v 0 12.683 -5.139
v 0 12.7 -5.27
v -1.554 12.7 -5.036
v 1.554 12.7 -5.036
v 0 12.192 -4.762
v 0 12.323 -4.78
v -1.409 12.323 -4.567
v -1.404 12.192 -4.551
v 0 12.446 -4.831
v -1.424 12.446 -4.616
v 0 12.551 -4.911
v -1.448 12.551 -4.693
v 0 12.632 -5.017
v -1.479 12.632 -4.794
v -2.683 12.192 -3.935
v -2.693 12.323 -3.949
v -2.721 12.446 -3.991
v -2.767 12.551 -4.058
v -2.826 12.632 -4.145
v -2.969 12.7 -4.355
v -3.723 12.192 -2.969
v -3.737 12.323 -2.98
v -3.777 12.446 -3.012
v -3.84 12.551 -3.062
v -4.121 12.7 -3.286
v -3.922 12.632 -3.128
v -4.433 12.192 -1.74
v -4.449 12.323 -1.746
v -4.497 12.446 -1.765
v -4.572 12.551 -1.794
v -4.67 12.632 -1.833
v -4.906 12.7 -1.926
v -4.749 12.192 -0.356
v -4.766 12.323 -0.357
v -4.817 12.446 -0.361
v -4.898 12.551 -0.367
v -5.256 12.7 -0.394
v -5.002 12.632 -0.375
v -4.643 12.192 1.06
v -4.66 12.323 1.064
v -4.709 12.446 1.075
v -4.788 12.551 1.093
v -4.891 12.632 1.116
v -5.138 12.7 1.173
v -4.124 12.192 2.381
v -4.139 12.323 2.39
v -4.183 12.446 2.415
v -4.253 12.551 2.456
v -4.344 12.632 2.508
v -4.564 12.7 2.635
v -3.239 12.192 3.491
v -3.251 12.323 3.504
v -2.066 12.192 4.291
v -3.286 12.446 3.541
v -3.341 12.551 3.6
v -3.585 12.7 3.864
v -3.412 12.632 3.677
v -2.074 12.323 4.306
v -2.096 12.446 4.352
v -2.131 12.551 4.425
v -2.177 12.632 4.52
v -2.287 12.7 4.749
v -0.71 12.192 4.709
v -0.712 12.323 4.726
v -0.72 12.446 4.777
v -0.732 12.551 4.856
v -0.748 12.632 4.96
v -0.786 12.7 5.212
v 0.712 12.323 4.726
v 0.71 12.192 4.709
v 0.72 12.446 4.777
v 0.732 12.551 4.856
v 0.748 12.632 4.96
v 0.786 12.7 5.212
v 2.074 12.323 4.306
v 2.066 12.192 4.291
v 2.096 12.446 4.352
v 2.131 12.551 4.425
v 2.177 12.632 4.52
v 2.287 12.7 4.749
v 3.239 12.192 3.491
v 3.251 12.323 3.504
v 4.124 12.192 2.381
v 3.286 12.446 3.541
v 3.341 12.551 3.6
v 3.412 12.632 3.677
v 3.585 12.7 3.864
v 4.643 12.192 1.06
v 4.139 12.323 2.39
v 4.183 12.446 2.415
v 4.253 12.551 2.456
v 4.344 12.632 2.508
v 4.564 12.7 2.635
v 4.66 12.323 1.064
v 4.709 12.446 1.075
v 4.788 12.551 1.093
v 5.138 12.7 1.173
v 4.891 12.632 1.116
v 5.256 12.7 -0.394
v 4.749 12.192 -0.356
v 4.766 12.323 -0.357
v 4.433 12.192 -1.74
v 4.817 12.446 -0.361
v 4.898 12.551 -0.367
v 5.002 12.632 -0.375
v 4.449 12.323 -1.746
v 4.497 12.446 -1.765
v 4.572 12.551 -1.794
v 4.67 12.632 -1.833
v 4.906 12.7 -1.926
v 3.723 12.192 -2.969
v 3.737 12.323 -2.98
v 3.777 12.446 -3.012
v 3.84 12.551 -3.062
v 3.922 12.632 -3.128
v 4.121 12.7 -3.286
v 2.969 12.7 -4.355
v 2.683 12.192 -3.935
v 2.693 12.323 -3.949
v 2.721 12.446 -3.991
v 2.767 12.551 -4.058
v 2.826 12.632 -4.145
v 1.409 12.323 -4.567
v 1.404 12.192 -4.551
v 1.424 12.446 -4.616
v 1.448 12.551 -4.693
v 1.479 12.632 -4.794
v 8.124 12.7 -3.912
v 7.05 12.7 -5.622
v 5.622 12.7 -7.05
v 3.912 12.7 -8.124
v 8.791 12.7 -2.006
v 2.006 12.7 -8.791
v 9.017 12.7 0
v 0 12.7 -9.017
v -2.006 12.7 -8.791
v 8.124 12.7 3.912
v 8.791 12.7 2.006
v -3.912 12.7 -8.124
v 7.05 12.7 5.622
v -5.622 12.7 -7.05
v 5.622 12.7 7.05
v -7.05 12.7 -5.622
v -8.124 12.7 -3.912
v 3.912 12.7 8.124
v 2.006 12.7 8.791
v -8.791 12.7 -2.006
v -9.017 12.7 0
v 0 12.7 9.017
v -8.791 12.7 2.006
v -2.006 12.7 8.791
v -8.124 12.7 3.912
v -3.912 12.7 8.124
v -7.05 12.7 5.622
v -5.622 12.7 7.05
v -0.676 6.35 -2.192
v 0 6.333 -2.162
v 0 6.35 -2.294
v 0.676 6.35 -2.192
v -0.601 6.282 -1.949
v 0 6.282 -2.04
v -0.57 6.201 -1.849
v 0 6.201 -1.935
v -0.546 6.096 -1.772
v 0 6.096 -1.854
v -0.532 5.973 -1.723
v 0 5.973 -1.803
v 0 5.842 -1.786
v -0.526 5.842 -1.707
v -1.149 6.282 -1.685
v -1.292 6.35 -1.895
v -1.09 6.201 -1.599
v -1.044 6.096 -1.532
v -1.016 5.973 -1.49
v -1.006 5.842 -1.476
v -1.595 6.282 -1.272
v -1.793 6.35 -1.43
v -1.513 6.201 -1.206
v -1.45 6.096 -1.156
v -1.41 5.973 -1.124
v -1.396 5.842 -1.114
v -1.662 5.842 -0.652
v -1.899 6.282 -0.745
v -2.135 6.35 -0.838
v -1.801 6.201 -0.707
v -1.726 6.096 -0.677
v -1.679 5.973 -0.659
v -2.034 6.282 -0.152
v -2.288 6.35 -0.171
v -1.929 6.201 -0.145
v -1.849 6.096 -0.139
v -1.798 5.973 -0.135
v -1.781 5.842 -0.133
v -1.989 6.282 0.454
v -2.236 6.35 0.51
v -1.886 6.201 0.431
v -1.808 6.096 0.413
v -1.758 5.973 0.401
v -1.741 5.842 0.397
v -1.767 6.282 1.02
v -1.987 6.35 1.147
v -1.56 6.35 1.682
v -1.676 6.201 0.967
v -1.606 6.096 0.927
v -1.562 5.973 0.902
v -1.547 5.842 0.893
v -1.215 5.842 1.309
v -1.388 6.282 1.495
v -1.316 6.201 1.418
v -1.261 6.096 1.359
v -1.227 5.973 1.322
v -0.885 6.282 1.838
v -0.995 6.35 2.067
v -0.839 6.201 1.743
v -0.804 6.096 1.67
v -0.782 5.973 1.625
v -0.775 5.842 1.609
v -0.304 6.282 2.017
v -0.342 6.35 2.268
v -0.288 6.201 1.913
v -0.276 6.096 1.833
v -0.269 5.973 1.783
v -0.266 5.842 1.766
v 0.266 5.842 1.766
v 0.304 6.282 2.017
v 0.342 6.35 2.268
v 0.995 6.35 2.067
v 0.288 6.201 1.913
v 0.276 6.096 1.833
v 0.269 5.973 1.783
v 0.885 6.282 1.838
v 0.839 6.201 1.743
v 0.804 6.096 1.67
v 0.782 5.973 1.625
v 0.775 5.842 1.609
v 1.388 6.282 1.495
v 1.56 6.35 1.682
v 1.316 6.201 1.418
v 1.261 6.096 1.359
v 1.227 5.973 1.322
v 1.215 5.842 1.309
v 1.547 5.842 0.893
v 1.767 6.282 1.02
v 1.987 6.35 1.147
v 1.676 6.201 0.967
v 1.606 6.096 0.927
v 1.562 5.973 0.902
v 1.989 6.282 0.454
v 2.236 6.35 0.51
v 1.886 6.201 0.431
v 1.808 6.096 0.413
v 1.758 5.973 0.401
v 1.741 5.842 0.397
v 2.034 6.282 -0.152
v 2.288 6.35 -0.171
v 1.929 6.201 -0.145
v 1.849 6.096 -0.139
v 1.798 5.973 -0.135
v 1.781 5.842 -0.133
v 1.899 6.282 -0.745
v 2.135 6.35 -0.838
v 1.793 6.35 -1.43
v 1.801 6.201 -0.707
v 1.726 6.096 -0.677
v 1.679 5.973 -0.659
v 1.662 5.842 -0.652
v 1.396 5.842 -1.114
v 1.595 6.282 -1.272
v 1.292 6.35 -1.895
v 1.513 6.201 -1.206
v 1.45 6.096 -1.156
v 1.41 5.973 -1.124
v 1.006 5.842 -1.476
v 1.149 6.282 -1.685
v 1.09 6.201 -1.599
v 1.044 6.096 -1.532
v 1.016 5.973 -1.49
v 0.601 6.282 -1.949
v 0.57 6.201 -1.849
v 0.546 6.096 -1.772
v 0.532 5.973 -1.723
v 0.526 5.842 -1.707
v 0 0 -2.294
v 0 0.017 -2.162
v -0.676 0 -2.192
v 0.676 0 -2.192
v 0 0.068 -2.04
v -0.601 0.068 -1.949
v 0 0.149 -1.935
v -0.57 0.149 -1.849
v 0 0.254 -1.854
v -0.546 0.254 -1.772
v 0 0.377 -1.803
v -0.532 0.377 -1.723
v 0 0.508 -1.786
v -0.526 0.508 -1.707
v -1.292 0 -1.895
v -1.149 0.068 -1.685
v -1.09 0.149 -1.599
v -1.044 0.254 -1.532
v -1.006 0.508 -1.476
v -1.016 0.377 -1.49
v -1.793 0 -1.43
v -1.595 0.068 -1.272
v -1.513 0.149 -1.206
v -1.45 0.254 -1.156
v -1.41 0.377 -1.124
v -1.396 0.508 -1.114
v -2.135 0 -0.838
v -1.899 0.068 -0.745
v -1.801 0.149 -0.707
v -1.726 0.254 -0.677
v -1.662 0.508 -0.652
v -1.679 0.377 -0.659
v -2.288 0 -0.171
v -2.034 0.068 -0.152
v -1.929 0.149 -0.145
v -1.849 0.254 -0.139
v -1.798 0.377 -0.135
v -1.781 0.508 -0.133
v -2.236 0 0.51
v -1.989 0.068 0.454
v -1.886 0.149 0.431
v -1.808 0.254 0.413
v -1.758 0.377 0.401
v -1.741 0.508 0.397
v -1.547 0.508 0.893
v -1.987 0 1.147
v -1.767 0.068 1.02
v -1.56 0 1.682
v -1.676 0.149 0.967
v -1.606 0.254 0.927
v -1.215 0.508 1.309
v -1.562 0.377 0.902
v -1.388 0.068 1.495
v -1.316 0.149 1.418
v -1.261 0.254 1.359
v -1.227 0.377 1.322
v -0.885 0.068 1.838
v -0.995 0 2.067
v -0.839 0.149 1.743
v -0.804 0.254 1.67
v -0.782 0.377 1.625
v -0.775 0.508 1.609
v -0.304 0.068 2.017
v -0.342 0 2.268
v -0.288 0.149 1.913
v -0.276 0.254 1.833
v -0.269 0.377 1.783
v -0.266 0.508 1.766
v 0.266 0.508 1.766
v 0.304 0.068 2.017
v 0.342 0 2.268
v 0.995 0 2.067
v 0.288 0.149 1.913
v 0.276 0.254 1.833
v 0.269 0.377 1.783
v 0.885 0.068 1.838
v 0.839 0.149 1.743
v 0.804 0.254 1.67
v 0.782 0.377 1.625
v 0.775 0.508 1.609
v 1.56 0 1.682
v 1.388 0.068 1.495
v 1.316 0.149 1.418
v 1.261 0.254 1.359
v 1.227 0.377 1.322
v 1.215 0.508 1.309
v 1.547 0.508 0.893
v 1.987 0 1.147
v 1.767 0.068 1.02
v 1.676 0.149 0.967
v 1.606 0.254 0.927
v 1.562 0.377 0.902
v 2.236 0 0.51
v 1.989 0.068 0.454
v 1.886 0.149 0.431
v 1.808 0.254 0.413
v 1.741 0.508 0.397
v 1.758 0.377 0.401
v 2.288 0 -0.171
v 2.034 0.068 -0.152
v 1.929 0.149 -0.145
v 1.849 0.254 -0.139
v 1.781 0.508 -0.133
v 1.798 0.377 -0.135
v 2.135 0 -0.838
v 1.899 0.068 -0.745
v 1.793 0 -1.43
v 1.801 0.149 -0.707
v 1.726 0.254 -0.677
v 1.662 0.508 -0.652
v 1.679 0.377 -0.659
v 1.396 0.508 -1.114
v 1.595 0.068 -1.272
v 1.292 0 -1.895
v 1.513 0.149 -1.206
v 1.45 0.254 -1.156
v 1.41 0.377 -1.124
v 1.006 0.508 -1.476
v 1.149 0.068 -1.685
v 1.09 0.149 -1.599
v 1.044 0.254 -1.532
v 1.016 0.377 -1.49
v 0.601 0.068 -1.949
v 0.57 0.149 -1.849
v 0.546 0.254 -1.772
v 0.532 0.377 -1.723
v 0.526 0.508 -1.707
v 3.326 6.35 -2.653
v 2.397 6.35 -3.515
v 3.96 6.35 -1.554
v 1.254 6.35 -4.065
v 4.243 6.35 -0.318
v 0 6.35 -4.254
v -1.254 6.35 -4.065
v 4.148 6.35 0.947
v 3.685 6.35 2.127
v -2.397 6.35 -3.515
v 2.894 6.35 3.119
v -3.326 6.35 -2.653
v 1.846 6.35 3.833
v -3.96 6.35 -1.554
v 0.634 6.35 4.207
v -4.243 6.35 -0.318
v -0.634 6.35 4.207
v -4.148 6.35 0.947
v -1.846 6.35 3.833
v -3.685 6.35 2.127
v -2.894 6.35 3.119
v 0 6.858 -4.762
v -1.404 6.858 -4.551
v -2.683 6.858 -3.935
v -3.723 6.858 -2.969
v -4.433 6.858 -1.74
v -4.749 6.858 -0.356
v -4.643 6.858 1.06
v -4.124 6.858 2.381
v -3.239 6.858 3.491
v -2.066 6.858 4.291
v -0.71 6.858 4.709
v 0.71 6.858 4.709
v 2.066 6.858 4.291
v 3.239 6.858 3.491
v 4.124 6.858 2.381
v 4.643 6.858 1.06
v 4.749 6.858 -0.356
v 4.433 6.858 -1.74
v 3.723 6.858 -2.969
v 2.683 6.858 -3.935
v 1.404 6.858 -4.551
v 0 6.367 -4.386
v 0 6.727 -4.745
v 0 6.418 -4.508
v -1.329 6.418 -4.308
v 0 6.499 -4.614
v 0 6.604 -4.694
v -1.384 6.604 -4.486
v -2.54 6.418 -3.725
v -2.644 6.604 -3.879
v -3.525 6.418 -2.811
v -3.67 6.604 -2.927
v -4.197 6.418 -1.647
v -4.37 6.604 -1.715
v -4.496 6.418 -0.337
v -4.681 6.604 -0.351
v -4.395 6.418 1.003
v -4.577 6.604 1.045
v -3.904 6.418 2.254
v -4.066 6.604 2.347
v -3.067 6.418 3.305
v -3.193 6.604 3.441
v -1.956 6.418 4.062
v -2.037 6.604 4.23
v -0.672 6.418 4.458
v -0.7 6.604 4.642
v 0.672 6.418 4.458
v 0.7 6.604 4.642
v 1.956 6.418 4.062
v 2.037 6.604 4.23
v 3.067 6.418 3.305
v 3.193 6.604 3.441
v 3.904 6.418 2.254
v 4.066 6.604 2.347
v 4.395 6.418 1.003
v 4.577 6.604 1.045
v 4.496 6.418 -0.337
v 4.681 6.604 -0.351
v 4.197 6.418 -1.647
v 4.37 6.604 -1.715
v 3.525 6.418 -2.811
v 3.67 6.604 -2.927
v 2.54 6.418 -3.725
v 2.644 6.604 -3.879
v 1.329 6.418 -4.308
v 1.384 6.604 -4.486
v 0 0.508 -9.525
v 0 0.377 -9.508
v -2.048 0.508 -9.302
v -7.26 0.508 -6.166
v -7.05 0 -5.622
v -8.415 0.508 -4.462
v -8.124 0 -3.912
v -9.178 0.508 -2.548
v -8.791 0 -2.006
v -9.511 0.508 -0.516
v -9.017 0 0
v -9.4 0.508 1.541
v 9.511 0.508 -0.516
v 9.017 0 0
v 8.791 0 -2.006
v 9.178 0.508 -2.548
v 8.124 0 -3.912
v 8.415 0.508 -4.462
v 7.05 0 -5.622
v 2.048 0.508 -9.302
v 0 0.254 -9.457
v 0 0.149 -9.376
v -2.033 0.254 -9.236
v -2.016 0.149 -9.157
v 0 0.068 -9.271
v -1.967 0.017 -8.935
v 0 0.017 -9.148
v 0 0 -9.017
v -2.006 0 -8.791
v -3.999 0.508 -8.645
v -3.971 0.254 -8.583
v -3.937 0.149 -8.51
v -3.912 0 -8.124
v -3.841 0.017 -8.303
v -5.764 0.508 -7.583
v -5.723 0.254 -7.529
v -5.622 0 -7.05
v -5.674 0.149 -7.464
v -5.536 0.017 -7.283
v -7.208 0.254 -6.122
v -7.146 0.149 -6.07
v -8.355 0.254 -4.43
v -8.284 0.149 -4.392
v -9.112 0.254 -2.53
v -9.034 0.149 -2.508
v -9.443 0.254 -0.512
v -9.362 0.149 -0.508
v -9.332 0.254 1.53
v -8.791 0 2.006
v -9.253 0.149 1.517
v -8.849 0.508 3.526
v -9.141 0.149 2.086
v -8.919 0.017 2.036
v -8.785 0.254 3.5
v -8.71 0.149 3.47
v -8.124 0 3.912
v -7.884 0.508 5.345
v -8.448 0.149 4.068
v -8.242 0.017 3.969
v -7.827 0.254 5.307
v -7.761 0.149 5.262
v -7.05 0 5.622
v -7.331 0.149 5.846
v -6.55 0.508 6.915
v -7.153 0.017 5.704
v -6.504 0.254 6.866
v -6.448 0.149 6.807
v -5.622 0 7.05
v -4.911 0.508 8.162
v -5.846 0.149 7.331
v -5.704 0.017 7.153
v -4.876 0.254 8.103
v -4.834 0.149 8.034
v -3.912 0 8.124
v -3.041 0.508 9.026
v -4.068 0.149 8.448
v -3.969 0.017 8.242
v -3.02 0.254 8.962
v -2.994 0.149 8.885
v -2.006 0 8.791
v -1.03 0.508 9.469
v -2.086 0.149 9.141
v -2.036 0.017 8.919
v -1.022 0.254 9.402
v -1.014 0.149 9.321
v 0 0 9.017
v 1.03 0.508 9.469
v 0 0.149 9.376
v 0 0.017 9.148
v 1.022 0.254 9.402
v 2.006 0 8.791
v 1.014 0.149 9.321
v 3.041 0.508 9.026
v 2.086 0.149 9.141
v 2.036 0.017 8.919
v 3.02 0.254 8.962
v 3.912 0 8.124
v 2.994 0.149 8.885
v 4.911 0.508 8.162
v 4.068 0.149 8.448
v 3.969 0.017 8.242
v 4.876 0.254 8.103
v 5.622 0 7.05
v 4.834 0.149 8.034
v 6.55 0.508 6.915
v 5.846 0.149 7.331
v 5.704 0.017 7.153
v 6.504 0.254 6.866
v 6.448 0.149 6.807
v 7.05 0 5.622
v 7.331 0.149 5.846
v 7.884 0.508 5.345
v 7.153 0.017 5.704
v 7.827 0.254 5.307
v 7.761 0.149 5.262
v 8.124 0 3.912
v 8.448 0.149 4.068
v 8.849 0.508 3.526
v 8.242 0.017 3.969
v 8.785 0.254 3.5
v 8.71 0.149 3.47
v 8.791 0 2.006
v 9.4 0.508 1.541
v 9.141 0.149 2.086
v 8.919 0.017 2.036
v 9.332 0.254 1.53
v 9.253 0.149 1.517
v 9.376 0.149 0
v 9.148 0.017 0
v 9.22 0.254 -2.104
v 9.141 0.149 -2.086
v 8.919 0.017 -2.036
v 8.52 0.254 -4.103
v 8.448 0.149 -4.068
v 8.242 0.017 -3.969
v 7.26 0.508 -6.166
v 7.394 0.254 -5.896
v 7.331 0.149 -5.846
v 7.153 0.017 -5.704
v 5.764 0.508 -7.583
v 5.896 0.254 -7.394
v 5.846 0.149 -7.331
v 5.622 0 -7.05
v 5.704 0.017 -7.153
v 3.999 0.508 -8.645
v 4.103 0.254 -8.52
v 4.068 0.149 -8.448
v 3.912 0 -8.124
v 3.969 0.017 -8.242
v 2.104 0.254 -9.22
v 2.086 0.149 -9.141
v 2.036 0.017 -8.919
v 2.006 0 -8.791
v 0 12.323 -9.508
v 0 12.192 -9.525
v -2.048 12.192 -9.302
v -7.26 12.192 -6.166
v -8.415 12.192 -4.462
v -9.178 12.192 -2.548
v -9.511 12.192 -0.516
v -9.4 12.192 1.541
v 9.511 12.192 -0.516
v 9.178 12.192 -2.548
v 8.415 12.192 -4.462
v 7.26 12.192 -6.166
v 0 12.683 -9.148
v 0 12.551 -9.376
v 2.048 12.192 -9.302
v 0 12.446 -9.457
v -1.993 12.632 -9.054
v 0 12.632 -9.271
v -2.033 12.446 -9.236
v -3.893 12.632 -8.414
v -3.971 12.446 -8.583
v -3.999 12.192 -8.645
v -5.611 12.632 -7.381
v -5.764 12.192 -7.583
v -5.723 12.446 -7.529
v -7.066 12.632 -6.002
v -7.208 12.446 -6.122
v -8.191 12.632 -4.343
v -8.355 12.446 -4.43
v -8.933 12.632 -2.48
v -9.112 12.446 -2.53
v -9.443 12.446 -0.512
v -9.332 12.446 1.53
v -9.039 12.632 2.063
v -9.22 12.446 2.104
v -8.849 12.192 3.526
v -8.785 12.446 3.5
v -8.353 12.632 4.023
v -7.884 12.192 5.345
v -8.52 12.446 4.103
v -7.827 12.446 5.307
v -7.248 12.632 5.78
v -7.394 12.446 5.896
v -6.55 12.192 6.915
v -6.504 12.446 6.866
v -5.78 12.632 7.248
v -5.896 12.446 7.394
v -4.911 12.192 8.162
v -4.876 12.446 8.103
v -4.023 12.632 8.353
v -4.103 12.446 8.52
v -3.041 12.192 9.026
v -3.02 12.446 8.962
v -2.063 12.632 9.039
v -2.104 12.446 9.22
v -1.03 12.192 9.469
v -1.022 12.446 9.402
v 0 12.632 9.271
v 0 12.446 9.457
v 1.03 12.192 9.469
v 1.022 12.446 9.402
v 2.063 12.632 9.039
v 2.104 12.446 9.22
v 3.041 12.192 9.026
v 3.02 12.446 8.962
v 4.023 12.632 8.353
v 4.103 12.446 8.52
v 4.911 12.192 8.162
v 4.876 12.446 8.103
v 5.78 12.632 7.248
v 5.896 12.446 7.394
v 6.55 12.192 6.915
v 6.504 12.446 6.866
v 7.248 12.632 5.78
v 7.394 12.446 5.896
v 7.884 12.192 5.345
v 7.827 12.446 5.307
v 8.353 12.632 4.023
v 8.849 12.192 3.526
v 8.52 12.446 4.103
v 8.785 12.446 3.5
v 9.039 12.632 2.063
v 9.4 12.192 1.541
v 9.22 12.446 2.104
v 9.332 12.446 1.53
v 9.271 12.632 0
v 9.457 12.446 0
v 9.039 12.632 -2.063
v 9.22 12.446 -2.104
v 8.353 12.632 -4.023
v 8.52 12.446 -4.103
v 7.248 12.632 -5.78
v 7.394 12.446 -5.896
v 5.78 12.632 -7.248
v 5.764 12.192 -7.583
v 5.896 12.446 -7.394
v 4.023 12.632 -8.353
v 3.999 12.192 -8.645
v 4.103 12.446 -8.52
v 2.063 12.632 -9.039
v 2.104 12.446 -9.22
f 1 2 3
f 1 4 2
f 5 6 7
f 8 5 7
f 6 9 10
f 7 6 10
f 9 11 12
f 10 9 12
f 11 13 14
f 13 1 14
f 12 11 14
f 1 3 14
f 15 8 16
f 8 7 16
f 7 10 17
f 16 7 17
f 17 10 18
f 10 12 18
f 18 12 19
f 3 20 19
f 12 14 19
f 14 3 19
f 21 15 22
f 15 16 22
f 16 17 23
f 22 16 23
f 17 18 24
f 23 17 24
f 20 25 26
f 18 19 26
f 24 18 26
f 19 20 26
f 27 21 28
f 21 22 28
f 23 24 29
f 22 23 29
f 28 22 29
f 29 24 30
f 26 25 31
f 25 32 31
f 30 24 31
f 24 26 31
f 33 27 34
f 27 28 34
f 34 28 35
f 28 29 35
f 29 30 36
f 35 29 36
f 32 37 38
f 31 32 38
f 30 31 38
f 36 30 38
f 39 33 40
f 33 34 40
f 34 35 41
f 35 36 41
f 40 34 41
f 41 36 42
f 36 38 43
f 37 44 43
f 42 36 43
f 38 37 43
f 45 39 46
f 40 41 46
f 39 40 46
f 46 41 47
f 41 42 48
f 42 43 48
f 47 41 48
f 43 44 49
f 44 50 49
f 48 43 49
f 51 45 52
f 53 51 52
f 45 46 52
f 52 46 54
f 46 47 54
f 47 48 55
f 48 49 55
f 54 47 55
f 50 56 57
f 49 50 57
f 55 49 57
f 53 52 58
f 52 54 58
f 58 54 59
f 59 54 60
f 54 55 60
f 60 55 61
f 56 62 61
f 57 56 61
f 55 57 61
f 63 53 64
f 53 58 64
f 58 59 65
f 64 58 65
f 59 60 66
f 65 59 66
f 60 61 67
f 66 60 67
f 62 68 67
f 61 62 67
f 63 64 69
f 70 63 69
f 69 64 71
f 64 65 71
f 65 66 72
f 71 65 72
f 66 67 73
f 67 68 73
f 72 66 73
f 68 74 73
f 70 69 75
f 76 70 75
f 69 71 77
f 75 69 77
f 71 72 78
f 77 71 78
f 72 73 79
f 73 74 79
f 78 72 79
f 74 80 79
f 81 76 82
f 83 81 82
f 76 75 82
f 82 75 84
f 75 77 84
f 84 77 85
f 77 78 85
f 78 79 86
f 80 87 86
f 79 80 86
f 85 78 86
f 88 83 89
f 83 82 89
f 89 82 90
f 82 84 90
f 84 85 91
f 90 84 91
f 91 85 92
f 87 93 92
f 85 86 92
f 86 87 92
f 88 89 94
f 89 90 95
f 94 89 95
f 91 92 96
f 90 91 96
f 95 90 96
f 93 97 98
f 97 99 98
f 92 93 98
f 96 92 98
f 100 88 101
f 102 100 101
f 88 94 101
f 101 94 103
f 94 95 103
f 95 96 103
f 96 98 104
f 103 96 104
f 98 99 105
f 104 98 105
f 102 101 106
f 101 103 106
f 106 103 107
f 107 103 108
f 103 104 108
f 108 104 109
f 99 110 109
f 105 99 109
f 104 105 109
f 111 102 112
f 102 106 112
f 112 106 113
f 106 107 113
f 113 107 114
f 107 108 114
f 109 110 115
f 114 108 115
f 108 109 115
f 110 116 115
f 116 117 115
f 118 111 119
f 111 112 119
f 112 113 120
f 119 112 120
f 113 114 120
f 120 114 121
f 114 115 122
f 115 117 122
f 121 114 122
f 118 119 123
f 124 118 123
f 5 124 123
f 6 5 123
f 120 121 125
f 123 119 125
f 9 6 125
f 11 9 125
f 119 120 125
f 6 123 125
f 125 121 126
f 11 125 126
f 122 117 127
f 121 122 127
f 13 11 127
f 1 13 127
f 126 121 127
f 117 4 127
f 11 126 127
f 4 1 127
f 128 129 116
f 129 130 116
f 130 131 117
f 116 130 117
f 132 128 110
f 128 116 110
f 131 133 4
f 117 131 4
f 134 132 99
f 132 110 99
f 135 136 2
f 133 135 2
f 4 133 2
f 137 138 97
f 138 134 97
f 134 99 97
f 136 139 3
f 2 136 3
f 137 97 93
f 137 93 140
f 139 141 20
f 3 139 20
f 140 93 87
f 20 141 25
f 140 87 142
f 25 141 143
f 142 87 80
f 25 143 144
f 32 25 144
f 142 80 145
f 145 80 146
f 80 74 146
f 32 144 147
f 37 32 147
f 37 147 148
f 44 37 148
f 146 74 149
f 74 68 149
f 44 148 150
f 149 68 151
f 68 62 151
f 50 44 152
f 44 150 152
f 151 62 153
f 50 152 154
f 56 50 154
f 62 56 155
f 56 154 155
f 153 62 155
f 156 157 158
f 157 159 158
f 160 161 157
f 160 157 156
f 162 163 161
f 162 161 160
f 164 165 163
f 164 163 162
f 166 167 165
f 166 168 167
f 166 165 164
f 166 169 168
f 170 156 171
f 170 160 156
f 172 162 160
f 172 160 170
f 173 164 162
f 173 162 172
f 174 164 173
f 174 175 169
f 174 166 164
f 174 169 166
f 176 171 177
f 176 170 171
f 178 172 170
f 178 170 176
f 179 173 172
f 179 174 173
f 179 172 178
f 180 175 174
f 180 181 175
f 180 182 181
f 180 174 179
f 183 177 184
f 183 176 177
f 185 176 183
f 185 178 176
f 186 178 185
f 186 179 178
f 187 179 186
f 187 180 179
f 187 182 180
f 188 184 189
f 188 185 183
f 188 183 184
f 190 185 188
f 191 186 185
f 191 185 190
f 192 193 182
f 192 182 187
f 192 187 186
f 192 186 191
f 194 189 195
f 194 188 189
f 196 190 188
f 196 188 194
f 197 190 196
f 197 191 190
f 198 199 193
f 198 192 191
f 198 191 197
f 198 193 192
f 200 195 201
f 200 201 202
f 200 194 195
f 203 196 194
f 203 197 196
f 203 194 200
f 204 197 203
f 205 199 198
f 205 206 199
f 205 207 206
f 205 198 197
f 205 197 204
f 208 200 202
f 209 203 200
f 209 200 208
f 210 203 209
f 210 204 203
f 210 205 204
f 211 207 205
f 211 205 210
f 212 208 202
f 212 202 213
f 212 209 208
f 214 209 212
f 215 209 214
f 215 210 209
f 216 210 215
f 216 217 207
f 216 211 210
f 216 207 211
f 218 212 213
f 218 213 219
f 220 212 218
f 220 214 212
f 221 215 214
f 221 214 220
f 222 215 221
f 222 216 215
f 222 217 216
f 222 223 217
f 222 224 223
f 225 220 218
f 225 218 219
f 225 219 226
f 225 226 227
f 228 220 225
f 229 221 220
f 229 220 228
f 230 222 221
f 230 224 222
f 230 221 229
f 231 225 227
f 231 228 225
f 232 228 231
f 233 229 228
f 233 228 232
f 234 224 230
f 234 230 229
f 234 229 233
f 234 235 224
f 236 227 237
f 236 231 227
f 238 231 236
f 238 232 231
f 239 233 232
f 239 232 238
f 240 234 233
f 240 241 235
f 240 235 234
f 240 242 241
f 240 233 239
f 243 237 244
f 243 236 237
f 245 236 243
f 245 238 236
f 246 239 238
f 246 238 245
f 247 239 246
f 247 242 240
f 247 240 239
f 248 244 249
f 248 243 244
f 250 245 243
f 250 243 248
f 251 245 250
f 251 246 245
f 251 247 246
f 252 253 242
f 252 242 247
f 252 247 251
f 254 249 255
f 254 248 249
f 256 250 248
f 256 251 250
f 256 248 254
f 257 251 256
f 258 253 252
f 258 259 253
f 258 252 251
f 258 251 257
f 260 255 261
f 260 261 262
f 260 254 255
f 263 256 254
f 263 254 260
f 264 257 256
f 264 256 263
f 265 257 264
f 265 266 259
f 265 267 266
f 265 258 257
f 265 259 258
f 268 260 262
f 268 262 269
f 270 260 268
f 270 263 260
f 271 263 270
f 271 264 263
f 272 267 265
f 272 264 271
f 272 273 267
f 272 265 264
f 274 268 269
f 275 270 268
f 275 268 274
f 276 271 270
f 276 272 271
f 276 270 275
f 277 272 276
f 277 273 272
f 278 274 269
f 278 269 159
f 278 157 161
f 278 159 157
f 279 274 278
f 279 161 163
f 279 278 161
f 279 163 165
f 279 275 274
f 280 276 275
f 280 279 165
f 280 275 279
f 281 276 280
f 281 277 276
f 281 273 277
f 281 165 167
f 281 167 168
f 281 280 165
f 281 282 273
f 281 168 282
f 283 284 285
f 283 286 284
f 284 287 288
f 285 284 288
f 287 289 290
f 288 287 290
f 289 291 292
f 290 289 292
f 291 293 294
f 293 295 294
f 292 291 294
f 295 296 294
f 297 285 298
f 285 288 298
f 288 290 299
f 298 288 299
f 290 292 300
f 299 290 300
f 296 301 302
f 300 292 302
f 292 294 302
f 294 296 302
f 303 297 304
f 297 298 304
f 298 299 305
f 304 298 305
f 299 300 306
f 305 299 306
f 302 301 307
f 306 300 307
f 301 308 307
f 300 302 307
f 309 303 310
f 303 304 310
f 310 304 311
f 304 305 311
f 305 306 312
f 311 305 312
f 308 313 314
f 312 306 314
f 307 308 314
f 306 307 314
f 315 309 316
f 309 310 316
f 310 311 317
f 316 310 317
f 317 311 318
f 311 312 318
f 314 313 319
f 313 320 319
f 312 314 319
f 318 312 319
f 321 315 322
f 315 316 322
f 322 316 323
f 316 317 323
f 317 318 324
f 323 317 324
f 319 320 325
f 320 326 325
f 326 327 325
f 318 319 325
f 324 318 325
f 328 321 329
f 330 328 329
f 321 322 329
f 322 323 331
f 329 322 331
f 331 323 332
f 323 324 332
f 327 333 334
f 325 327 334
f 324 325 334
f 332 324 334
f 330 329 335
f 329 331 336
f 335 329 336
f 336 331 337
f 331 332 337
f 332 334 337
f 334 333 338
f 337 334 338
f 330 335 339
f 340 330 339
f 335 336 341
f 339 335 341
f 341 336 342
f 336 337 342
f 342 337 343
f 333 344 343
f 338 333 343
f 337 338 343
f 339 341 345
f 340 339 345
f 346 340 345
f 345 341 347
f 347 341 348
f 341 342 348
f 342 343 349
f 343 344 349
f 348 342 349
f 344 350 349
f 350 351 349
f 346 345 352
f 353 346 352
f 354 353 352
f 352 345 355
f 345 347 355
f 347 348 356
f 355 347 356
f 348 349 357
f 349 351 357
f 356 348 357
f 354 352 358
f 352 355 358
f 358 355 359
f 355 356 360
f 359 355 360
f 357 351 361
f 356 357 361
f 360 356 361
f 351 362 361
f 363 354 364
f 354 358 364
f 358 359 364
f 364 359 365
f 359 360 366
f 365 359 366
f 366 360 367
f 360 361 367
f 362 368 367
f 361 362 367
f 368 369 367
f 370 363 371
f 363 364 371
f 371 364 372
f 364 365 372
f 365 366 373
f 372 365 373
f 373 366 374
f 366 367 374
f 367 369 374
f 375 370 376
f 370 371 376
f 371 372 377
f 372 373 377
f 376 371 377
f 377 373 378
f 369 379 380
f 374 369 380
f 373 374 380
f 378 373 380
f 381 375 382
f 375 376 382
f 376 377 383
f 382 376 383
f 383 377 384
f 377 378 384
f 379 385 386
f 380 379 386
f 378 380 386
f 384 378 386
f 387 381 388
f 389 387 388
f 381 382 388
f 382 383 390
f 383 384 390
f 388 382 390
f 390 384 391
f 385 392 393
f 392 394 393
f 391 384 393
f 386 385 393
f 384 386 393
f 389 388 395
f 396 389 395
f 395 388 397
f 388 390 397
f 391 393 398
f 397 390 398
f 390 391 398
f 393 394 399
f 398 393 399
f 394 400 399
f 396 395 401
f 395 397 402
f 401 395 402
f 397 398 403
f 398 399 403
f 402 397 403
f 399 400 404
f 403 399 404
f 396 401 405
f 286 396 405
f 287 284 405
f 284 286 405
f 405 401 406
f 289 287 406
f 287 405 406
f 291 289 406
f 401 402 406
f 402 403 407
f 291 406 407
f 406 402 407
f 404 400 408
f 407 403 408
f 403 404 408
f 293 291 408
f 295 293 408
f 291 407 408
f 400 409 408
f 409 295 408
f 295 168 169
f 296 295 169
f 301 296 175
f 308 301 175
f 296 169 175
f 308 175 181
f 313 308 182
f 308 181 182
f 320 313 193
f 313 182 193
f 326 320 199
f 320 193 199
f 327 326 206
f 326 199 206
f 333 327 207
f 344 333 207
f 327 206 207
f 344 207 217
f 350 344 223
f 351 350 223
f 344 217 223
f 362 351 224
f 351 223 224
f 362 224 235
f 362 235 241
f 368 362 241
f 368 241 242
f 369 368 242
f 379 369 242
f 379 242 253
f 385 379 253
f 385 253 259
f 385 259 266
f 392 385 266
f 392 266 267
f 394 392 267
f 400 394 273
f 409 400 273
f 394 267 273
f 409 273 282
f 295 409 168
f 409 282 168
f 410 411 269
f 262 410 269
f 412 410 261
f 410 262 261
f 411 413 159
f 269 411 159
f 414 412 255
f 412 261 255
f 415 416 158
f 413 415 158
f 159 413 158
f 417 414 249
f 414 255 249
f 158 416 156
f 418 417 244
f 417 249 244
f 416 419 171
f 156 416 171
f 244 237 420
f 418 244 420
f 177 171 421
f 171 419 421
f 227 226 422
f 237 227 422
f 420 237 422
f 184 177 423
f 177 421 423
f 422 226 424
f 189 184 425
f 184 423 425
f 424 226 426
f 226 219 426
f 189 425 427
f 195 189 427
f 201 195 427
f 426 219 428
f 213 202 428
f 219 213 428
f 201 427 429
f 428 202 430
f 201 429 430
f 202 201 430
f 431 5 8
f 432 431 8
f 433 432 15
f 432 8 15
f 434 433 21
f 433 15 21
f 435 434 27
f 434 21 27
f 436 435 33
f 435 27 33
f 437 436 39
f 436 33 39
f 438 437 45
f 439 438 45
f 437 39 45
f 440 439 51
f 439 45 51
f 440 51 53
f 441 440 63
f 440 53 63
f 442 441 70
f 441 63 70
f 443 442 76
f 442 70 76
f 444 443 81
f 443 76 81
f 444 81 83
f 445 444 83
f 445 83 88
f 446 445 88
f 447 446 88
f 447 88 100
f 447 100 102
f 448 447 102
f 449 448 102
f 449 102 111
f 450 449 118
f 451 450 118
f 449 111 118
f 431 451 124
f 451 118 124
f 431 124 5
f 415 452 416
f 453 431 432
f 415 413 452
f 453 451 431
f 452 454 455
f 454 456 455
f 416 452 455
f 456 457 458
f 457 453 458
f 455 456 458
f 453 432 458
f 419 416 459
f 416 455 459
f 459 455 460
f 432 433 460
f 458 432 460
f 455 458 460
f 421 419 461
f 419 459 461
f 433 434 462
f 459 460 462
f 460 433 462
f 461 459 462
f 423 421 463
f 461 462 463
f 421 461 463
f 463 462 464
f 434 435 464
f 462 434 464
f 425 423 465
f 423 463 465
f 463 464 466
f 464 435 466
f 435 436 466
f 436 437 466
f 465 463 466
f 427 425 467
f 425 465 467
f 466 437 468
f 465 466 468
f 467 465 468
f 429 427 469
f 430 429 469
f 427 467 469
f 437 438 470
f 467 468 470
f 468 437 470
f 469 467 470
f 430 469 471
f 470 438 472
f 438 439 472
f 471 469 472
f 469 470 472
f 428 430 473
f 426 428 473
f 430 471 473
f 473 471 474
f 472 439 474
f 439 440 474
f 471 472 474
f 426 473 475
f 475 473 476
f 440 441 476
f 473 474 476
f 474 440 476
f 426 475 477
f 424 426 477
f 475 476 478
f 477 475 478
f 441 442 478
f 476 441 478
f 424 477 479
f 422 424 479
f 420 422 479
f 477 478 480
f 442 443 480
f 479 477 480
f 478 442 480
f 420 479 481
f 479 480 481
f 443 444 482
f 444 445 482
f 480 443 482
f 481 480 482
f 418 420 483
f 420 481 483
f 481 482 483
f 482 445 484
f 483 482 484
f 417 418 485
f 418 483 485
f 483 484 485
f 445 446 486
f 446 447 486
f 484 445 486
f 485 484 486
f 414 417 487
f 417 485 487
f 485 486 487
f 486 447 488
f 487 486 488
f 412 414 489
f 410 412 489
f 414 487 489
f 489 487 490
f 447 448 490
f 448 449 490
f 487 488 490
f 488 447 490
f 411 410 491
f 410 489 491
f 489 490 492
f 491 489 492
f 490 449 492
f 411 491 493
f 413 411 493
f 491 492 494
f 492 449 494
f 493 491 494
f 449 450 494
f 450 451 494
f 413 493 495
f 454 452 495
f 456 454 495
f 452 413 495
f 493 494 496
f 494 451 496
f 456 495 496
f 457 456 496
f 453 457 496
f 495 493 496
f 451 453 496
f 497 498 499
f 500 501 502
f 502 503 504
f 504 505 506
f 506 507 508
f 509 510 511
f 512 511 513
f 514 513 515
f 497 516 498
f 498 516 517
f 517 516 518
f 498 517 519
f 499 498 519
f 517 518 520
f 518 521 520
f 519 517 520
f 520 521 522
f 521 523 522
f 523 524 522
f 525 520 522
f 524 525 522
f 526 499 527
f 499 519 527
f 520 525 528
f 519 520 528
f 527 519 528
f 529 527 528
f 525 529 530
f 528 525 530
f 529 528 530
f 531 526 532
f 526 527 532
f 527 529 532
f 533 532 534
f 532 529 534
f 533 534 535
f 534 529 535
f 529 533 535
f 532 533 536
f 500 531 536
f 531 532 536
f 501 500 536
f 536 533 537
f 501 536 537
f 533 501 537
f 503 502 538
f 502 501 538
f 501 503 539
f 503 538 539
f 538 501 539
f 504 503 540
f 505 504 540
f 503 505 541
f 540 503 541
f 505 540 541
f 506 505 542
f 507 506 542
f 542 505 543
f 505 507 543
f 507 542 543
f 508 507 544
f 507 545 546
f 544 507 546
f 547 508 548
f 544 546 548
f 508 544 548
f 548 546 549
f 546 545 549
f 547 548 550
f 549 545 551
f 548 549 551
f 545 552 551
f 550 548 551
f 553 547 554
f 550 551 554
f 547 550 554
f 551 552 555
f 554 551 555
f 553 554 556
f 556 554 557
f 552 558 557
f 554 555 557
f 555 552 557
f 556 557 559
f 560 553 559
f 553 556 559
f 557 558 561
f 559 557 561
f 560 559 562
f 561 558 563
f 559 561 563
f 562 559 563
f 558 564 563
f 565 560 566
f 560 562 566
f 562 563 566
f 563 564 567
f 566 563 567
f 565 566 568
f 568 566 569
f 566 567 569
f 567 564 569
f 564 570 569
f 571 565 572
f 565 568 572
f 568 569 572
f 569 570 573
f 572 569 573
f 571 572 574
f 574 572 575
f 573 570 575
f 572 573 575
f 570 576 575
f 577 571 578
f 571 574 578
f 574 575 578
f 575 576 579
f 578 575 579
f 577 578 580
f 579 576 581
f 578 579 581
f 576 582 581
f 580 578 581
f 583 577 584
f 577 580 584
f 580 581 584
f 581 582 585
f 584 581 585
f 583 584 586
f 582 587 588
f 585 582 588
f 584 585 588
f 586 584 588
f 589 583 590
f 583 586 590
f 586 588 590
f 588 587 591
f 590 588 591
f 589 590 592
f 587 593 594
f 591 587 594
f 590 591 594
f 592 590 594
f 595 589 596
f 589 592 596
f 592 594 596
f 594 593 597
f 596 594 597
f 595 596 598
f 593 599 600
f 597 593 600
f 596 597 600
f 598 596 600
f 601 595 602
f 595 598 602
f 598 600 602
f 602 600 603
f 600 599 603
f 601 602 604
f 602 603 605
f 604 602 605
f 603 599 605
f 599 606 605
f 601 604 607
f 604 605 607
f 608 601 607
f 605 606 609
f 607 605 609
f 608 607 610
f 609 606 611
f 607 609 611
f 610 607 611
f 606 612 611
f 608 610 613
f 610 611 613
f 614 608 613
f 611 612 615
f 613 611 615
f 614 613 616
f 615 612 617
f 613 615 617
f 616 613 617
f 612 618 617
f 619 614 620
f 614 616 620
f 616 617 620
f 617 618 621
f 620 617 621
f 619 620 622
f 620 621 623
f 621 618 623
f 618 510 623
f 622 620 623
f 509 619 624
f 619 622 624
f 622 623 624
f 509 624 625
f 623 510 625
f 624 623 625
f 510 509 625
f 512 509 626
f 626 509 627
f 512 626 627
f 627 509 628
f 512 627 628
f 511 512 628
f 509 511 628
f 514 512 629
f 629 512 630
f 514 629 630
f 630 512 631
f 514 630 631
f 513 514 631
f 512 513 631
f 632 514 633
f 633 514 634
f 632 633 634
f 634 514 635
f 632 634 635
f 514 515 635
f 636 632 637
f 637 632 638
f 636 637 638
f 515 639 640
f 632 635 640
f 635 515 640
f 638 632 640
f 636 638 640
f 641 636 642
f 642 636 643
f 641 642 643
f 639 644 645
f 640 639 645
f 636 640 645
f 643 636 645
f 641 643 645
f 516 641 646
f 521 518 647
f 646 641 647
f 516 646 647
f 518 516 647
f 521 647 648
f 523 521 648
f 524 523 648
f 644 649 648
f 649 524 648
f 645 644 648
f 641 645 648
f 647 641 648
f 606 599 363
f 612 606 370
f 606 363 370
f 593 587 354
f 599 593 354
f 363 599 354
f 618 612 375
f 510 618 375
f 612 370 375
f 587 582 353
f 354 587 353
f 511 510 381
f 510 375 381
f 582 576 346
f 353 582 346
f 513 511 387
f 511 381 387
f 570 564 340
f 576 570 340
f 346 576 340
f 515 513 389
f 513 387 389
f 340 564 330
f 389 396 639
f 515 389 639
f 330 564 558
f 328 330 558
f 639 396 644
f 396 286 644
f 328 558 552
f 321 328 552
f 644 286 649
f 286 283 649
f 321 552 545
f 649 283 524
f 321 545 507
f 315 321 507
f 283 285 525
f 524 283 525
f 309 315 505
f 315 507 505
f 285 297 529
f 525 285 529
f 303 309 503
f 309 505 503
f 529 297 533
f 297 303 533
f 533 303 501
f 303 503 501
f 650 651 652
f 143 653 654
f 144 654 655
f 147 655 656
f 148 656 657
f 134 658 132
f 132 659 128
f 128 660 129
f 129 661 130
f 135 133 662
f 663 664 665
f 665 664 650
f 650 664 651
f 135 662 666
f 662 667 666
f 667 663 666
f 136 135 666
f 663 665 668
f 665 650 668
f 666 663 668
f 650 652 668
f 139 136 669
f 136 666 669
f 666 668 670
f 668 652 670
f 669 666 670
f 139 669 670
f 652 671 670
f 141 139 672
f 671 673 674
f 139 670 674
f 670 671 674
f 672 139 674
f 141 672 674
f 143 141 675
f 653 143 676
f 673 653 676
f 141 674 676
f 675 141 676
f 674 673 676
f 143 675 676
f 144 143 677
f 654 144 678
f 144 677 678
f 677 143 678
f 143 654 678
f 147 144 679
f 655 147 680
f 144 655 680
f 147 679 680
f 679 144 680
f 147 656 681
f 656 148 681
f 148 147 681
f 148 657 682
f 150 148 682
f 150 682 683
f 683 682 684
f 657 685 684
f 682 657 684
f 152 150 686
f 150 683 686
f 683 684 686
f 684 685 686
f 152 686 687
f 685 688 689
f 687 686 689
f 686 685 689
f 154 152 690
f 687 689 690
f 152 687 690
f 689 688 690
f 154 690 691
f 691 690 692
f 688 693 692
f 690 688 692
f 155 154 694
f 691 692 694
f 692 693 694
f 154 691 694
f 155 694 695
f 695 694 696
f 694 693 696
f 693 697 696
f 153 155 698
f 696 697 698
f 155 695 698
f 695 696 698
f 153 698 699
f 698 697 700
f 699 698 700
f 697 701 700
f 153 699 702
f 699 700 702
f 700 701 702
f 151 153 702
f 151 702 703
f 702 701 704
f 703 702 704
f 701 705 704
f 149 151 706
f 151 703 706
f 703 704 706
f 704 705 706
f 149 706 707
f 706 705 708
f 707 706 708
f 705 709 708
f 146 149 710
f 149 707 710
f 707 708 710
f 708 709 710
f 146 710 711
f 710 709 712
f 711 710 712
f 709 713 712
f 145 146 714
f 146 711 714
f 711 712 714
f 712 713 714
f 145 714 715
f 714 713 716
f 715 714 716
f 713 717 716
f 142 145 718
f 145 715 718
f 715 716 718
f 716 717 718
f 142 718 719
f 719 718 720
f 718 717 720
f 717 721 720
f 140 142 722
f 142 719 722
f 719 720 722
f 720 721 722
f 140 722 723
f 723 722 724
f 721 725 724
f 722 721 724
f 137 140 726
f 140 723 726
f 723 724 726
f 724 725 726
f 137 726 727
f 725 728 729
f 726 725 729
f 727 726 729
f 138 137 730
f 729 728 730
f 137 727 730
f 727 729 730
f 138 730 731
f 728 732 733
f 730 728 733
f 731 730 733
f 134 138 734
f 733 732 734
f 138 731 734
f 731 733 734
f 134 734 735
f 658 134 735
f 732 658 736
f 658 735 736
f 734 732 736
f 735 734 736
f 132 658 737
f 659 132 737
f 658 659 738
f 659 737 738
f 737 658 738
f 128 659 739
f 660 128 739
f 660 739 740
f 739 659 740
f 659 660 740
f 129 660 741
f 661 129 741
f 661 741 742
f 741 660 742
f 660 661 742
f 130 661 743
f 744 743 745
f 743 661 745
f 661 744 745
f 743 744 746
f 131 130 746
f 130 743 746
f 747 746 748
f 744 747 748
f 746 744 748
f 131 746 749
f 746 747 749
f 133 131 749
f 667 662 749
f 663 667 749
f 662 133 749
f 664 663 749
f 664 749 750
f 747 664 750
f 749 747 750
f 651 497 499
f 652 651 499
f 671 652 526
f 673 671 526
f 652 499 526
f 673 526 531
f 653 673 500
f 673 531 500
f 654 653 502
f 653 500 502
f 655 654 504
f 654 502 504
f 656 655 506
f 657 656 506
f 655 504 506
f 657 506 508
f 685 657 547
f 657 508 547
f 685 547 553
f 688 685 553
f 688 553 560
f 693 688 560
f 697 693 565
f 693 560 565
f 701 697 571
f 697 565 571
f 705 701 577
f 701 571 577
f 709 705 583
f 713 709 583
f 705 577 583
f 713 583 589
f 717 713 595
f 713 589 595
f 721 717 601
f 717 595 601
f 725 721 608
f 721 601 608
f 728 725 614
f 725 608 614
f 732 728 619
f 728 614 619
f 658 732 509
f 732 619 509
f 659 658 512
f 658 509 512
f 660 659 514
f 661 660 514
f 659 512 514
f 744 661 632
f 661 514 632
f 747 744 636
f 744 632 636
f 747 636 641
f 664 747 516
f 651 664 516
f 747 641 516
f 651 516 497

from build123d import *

# Parameters (mm, degrees)
FILLET1_R = 0.508


with BuildPart() as part:
    # Sketch1 → Revolve1 (revolve)
    with BuildSketch(Plane(origin=(0, 0, 0), x_dir=(0, 0, -1), z_dir=(1, 0, 0))):
        Polygon((1.7859375, 6.35), (4.7625, 6.35), (4.7625, 12.7), (9.525, 12.7), (9.525, 0), (1.7859375, 0), align=None)
    revolve(axis=Axis((0, 0, 0), (0, 1, 0)))

    # Fillet1
    fillet1_edges = [part.edges().sort_by_distance(p)[0] for p in [
        (0, 6.35, 4.7625),
        (0, 6.35, 1.7859375),
        (0, 0, 1.7859375),
        (0, 0, 9.525),
        (0, 12.7, 9.525),
        (0, 12.7, 4.7625),
    ]]
    fillet(fillet1_edges, radius=FILLET1_R)


solid = part.part
